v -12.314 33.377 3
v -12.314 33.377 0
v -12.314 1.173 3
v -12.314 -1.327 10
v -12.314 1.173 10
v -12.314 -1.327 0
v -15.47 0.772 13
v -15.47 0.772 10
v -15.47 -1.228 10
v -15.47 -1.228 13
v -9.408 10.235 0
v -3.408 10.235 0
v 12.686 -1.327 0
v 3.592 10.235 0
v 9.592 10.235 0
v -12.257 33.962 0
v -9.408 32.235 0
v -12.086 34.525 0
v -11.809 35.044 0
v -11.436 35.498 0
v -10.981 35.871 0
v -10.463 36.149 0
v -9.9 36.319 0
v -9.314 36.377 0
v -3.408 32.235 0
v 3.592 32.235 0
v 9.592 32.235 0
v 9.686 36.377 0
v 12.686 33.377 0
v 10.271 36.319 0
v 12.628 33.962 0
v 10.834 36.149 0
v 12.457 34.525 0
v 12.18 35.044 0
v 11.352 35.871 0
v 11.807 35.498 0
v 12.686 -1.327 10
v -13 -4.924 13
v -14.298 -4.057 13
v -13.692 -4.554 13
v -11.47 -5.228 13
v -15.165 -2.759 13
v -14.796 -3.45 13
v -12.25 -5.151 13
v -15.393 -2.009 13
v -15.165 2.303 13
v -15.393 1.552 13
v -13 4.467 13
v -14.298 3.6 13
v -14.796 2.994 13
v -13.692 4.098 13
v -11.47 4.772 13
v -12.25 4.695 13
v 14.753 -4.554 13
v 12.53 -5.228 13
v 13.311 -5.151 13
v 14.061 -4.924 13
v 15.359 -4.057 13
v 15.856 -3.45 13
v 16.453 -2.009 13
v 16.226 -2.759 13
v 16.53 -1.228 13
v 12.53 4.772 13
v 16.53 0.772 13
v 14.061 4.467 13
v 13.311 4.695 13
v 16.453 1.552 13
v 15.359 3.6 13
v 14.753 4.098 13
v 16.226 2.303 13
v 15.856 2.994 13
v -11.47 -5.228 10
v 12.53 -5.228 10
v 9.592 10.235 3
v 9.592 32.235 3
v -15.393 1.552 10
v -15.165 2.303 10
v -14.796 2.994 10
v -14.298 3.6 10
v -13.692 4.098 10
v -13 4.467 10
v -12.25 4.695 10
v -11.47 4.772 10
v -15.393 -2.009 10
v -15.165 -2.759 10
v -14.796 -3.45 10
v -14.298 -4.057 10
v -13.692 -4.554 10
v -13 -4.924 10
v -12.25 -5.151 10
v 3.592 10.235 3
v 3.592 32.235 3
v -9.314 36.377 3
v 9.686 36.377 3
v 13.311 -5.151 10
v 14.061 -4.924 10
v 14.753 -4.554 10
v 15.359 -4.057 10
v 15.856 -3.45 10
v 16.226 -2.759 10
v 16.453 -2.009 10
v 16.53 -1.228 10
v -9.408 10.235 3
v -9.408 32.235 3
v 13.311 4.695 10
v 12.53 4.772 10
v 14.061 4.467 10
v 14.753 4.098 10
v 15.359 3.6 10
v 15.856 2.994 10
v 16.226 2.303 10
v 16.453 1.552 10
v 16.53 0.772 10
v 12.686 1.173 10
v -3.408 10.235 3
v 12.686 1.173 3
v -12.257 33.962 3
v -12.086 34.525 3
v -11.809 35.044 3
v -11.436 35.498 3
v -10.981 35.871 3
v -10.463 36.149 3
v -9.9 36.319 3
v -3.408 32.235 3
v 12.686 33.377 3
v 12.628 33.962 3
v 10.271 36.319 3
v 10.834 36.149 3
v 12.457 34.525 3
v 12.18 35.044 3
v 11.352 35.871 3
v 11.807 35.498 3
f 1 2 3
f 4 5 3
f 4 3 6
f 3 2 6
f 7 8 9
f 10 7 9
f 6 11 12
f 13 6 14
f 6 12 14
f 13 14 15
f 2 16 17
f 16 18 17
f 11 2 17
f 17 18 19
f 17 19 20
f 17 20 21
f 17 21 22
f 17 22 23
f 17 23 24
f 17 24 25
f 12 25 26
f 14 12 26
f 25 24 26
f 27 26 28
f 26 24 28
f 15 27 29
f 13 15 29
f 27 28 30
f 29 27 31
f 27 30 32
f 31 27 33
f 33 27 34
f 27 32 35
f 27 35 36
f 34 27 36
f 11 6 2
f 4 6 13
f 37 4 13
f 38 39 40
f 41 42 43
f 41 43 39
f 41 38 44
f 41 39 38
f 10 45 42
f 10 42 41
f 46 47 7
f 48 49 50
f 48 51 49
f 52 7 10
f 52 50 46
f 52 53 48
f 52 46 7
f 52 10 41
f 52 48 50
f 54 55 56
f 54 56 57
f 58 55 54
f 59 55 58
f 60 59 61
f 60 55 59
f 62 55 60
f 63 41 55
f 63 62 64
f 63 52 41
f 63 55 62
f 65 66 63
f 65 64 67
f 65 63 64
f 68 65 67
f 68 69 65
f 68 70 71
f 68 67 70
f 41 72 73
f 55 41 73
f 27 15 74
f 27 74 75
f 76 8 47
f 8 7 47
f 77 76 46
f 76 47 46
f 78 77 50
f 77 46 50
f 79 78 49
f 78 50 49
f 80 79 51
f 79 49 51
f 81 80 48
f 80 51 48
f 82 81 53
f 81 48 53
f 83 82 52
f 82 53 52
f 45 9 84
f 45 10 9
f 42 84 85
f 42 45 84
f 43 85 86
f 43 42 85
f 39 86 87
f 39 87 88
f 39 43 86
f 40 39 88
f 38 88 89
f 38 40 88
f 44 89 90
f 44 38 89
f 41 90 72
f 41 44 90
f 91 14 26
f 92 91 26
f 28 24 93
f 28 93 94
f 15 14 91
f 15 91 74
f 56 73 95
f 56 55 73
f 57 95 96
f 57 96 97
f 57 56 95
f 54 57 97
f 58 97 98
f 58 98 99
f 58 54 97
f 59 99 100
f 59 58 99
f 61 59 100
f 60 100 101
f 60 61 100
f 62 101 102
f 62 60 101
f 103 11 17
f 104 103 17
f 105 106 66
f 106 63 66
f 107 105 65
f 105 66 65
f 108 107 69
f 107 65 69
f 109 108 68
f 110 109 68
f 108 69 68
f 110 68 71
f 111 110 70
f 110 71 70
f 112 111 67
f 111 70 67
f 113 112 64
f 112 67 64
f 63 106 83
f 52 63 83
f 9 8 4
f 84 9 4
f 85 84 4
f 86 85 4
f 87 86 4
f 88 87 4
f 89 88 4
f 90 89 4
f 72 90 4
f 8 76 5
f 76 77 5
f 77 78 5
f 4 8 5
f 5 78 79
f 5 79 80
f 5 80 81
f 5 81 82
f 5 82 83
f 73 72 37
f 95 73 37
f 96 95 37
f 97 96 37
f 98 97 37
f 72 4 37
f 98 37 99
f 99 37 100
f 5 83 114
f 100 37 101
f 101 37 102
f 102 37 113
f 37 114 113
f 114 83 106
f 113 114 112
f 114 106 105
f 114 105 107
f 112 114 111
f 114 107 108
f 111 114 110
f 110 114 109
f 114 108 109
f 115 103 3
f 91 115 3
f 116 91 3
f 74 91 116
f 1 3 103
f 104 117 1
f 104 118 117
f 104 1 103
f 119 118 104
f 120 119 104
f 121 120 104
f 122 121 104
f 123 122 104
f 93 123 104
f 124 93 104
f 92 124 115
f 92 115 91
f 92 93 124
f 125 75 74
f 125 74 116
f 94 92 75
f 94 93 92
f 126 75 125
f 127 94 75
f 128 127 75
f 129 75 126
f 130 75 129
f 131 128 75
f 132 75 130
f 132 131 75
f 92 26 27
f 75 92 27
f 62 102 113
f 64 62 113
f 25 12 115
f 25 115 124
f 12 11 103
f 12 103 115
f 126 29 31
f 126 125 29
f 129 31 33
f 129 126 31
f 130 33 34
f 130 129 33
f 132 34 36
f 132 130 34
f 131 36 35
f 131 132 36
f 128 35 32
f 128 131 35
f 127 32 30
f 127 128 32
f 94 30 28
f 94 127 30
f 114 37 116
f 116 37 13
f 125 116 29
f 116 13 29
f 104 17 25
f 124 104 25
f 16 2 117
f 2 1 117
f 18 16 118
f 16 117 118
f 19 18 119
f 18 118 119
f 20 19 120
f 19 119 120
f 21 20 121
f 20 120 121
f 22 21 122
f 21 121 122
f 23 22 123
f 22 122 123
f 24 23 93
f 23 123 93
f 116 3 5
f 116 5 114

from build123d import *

# Parameters (mm, degrees)
F0_W     = 25
F0_H     = 3.598708484
F0_H_2   = 2.5
F0_H_3   = 31.6051654611
F0_W_2   = 6
F0_H_4   = 22
F1_DEPTH = 3
F2_DEPTH = 10
F3_START = 10
F3_DEPTH = 3
F4_R     = 4
F5_R     = 3


# Not quite as in the source:
# - a feature names something its author has since deleted; it is built from what else it names


with BuildPart() as f1:
    # F0 (on Top) → F1 (new body)
    with BuildSketch(Plane.XY):
        with Locations((0.1855289564, 2.9724632242)):
            Rectangle(F0_W, F0_H)
        with Locations((0.1855289564, -0.0768910178)):
            Rectangle(F0_W, F0_H_2)
        with Locations((0.1855289564, 20.5744001968)):
            Rectangle(F0_W, F0_H_3)
        with Locations((-6.4080492333, 21.2351317182)):
            Rectangle(F0_W_2, F0_H_4, mode=Mode.SUBTRACT)
        with Locations((6.5919507667, 21.2351317182)):
            Rectangle(F0_W_2, F0_H_4, mode=Mode.SUBTRACT)
    extrude(amount=F1_DEPTH)

    # F0 (on Top) → F2 (join)
    with BuildSketch(Plane.XY):
        with Locations((0.1855289564, -0.0768910178)):
            Rectangle(F0_W, F0_H_2)
    extrude(amount=F2_DEPTH)

    # F0 (on Top) → F3 (join)
    with BuildSketch(Plane.XY.offset(F3_START)):
        with Locations((0.1855289564, 2.9724632242)):
            Rectangle(F0_W, F0_H)
        Polygon((-12.3144710436, -1.3268910178), (-12.3144710436, 1.1731089822), (-12.3144710436, 4.7718174662), (-15.4697376937, 4.7718174662), (-15.4697376937, -5.2281825338), (16.5302623063, -5.2281825338), (16.5302623063, 4.7718174662), (12.6855289564, 4.7718174662), (12.6855289564, 1.1731089822), (12.6855289564, -1.3268910178), align=None)
        with Locations((0.1855289564, -0.0768910178)):
            Rectangle(F0_W, F0_H_2)
    extrude(amount=F3_DEPTH)

    # F4
    f4_edges = [f1.edges().sort_by_distance(p)[0] for p in [
        (16.530262, -5.228183, 11.5),
        (16.530262, 4.771817, 11.5),
        (-15.469738, -5.228183, 11.5),
        (-15.469738, 4.771817, 11.5),
    ]]
    fillet(f4_edges, radius=F4_R)

    # F5
    f5_edges = [f1.edges().sort_by_distance(p)[0] for p in [
        (-12.314471, 36.376983, 1.5),
        (12.685529, 36.376983, 1.5),
    ]]
    fillet(f5_edges, radius=F5_R)


solid = f1.part
